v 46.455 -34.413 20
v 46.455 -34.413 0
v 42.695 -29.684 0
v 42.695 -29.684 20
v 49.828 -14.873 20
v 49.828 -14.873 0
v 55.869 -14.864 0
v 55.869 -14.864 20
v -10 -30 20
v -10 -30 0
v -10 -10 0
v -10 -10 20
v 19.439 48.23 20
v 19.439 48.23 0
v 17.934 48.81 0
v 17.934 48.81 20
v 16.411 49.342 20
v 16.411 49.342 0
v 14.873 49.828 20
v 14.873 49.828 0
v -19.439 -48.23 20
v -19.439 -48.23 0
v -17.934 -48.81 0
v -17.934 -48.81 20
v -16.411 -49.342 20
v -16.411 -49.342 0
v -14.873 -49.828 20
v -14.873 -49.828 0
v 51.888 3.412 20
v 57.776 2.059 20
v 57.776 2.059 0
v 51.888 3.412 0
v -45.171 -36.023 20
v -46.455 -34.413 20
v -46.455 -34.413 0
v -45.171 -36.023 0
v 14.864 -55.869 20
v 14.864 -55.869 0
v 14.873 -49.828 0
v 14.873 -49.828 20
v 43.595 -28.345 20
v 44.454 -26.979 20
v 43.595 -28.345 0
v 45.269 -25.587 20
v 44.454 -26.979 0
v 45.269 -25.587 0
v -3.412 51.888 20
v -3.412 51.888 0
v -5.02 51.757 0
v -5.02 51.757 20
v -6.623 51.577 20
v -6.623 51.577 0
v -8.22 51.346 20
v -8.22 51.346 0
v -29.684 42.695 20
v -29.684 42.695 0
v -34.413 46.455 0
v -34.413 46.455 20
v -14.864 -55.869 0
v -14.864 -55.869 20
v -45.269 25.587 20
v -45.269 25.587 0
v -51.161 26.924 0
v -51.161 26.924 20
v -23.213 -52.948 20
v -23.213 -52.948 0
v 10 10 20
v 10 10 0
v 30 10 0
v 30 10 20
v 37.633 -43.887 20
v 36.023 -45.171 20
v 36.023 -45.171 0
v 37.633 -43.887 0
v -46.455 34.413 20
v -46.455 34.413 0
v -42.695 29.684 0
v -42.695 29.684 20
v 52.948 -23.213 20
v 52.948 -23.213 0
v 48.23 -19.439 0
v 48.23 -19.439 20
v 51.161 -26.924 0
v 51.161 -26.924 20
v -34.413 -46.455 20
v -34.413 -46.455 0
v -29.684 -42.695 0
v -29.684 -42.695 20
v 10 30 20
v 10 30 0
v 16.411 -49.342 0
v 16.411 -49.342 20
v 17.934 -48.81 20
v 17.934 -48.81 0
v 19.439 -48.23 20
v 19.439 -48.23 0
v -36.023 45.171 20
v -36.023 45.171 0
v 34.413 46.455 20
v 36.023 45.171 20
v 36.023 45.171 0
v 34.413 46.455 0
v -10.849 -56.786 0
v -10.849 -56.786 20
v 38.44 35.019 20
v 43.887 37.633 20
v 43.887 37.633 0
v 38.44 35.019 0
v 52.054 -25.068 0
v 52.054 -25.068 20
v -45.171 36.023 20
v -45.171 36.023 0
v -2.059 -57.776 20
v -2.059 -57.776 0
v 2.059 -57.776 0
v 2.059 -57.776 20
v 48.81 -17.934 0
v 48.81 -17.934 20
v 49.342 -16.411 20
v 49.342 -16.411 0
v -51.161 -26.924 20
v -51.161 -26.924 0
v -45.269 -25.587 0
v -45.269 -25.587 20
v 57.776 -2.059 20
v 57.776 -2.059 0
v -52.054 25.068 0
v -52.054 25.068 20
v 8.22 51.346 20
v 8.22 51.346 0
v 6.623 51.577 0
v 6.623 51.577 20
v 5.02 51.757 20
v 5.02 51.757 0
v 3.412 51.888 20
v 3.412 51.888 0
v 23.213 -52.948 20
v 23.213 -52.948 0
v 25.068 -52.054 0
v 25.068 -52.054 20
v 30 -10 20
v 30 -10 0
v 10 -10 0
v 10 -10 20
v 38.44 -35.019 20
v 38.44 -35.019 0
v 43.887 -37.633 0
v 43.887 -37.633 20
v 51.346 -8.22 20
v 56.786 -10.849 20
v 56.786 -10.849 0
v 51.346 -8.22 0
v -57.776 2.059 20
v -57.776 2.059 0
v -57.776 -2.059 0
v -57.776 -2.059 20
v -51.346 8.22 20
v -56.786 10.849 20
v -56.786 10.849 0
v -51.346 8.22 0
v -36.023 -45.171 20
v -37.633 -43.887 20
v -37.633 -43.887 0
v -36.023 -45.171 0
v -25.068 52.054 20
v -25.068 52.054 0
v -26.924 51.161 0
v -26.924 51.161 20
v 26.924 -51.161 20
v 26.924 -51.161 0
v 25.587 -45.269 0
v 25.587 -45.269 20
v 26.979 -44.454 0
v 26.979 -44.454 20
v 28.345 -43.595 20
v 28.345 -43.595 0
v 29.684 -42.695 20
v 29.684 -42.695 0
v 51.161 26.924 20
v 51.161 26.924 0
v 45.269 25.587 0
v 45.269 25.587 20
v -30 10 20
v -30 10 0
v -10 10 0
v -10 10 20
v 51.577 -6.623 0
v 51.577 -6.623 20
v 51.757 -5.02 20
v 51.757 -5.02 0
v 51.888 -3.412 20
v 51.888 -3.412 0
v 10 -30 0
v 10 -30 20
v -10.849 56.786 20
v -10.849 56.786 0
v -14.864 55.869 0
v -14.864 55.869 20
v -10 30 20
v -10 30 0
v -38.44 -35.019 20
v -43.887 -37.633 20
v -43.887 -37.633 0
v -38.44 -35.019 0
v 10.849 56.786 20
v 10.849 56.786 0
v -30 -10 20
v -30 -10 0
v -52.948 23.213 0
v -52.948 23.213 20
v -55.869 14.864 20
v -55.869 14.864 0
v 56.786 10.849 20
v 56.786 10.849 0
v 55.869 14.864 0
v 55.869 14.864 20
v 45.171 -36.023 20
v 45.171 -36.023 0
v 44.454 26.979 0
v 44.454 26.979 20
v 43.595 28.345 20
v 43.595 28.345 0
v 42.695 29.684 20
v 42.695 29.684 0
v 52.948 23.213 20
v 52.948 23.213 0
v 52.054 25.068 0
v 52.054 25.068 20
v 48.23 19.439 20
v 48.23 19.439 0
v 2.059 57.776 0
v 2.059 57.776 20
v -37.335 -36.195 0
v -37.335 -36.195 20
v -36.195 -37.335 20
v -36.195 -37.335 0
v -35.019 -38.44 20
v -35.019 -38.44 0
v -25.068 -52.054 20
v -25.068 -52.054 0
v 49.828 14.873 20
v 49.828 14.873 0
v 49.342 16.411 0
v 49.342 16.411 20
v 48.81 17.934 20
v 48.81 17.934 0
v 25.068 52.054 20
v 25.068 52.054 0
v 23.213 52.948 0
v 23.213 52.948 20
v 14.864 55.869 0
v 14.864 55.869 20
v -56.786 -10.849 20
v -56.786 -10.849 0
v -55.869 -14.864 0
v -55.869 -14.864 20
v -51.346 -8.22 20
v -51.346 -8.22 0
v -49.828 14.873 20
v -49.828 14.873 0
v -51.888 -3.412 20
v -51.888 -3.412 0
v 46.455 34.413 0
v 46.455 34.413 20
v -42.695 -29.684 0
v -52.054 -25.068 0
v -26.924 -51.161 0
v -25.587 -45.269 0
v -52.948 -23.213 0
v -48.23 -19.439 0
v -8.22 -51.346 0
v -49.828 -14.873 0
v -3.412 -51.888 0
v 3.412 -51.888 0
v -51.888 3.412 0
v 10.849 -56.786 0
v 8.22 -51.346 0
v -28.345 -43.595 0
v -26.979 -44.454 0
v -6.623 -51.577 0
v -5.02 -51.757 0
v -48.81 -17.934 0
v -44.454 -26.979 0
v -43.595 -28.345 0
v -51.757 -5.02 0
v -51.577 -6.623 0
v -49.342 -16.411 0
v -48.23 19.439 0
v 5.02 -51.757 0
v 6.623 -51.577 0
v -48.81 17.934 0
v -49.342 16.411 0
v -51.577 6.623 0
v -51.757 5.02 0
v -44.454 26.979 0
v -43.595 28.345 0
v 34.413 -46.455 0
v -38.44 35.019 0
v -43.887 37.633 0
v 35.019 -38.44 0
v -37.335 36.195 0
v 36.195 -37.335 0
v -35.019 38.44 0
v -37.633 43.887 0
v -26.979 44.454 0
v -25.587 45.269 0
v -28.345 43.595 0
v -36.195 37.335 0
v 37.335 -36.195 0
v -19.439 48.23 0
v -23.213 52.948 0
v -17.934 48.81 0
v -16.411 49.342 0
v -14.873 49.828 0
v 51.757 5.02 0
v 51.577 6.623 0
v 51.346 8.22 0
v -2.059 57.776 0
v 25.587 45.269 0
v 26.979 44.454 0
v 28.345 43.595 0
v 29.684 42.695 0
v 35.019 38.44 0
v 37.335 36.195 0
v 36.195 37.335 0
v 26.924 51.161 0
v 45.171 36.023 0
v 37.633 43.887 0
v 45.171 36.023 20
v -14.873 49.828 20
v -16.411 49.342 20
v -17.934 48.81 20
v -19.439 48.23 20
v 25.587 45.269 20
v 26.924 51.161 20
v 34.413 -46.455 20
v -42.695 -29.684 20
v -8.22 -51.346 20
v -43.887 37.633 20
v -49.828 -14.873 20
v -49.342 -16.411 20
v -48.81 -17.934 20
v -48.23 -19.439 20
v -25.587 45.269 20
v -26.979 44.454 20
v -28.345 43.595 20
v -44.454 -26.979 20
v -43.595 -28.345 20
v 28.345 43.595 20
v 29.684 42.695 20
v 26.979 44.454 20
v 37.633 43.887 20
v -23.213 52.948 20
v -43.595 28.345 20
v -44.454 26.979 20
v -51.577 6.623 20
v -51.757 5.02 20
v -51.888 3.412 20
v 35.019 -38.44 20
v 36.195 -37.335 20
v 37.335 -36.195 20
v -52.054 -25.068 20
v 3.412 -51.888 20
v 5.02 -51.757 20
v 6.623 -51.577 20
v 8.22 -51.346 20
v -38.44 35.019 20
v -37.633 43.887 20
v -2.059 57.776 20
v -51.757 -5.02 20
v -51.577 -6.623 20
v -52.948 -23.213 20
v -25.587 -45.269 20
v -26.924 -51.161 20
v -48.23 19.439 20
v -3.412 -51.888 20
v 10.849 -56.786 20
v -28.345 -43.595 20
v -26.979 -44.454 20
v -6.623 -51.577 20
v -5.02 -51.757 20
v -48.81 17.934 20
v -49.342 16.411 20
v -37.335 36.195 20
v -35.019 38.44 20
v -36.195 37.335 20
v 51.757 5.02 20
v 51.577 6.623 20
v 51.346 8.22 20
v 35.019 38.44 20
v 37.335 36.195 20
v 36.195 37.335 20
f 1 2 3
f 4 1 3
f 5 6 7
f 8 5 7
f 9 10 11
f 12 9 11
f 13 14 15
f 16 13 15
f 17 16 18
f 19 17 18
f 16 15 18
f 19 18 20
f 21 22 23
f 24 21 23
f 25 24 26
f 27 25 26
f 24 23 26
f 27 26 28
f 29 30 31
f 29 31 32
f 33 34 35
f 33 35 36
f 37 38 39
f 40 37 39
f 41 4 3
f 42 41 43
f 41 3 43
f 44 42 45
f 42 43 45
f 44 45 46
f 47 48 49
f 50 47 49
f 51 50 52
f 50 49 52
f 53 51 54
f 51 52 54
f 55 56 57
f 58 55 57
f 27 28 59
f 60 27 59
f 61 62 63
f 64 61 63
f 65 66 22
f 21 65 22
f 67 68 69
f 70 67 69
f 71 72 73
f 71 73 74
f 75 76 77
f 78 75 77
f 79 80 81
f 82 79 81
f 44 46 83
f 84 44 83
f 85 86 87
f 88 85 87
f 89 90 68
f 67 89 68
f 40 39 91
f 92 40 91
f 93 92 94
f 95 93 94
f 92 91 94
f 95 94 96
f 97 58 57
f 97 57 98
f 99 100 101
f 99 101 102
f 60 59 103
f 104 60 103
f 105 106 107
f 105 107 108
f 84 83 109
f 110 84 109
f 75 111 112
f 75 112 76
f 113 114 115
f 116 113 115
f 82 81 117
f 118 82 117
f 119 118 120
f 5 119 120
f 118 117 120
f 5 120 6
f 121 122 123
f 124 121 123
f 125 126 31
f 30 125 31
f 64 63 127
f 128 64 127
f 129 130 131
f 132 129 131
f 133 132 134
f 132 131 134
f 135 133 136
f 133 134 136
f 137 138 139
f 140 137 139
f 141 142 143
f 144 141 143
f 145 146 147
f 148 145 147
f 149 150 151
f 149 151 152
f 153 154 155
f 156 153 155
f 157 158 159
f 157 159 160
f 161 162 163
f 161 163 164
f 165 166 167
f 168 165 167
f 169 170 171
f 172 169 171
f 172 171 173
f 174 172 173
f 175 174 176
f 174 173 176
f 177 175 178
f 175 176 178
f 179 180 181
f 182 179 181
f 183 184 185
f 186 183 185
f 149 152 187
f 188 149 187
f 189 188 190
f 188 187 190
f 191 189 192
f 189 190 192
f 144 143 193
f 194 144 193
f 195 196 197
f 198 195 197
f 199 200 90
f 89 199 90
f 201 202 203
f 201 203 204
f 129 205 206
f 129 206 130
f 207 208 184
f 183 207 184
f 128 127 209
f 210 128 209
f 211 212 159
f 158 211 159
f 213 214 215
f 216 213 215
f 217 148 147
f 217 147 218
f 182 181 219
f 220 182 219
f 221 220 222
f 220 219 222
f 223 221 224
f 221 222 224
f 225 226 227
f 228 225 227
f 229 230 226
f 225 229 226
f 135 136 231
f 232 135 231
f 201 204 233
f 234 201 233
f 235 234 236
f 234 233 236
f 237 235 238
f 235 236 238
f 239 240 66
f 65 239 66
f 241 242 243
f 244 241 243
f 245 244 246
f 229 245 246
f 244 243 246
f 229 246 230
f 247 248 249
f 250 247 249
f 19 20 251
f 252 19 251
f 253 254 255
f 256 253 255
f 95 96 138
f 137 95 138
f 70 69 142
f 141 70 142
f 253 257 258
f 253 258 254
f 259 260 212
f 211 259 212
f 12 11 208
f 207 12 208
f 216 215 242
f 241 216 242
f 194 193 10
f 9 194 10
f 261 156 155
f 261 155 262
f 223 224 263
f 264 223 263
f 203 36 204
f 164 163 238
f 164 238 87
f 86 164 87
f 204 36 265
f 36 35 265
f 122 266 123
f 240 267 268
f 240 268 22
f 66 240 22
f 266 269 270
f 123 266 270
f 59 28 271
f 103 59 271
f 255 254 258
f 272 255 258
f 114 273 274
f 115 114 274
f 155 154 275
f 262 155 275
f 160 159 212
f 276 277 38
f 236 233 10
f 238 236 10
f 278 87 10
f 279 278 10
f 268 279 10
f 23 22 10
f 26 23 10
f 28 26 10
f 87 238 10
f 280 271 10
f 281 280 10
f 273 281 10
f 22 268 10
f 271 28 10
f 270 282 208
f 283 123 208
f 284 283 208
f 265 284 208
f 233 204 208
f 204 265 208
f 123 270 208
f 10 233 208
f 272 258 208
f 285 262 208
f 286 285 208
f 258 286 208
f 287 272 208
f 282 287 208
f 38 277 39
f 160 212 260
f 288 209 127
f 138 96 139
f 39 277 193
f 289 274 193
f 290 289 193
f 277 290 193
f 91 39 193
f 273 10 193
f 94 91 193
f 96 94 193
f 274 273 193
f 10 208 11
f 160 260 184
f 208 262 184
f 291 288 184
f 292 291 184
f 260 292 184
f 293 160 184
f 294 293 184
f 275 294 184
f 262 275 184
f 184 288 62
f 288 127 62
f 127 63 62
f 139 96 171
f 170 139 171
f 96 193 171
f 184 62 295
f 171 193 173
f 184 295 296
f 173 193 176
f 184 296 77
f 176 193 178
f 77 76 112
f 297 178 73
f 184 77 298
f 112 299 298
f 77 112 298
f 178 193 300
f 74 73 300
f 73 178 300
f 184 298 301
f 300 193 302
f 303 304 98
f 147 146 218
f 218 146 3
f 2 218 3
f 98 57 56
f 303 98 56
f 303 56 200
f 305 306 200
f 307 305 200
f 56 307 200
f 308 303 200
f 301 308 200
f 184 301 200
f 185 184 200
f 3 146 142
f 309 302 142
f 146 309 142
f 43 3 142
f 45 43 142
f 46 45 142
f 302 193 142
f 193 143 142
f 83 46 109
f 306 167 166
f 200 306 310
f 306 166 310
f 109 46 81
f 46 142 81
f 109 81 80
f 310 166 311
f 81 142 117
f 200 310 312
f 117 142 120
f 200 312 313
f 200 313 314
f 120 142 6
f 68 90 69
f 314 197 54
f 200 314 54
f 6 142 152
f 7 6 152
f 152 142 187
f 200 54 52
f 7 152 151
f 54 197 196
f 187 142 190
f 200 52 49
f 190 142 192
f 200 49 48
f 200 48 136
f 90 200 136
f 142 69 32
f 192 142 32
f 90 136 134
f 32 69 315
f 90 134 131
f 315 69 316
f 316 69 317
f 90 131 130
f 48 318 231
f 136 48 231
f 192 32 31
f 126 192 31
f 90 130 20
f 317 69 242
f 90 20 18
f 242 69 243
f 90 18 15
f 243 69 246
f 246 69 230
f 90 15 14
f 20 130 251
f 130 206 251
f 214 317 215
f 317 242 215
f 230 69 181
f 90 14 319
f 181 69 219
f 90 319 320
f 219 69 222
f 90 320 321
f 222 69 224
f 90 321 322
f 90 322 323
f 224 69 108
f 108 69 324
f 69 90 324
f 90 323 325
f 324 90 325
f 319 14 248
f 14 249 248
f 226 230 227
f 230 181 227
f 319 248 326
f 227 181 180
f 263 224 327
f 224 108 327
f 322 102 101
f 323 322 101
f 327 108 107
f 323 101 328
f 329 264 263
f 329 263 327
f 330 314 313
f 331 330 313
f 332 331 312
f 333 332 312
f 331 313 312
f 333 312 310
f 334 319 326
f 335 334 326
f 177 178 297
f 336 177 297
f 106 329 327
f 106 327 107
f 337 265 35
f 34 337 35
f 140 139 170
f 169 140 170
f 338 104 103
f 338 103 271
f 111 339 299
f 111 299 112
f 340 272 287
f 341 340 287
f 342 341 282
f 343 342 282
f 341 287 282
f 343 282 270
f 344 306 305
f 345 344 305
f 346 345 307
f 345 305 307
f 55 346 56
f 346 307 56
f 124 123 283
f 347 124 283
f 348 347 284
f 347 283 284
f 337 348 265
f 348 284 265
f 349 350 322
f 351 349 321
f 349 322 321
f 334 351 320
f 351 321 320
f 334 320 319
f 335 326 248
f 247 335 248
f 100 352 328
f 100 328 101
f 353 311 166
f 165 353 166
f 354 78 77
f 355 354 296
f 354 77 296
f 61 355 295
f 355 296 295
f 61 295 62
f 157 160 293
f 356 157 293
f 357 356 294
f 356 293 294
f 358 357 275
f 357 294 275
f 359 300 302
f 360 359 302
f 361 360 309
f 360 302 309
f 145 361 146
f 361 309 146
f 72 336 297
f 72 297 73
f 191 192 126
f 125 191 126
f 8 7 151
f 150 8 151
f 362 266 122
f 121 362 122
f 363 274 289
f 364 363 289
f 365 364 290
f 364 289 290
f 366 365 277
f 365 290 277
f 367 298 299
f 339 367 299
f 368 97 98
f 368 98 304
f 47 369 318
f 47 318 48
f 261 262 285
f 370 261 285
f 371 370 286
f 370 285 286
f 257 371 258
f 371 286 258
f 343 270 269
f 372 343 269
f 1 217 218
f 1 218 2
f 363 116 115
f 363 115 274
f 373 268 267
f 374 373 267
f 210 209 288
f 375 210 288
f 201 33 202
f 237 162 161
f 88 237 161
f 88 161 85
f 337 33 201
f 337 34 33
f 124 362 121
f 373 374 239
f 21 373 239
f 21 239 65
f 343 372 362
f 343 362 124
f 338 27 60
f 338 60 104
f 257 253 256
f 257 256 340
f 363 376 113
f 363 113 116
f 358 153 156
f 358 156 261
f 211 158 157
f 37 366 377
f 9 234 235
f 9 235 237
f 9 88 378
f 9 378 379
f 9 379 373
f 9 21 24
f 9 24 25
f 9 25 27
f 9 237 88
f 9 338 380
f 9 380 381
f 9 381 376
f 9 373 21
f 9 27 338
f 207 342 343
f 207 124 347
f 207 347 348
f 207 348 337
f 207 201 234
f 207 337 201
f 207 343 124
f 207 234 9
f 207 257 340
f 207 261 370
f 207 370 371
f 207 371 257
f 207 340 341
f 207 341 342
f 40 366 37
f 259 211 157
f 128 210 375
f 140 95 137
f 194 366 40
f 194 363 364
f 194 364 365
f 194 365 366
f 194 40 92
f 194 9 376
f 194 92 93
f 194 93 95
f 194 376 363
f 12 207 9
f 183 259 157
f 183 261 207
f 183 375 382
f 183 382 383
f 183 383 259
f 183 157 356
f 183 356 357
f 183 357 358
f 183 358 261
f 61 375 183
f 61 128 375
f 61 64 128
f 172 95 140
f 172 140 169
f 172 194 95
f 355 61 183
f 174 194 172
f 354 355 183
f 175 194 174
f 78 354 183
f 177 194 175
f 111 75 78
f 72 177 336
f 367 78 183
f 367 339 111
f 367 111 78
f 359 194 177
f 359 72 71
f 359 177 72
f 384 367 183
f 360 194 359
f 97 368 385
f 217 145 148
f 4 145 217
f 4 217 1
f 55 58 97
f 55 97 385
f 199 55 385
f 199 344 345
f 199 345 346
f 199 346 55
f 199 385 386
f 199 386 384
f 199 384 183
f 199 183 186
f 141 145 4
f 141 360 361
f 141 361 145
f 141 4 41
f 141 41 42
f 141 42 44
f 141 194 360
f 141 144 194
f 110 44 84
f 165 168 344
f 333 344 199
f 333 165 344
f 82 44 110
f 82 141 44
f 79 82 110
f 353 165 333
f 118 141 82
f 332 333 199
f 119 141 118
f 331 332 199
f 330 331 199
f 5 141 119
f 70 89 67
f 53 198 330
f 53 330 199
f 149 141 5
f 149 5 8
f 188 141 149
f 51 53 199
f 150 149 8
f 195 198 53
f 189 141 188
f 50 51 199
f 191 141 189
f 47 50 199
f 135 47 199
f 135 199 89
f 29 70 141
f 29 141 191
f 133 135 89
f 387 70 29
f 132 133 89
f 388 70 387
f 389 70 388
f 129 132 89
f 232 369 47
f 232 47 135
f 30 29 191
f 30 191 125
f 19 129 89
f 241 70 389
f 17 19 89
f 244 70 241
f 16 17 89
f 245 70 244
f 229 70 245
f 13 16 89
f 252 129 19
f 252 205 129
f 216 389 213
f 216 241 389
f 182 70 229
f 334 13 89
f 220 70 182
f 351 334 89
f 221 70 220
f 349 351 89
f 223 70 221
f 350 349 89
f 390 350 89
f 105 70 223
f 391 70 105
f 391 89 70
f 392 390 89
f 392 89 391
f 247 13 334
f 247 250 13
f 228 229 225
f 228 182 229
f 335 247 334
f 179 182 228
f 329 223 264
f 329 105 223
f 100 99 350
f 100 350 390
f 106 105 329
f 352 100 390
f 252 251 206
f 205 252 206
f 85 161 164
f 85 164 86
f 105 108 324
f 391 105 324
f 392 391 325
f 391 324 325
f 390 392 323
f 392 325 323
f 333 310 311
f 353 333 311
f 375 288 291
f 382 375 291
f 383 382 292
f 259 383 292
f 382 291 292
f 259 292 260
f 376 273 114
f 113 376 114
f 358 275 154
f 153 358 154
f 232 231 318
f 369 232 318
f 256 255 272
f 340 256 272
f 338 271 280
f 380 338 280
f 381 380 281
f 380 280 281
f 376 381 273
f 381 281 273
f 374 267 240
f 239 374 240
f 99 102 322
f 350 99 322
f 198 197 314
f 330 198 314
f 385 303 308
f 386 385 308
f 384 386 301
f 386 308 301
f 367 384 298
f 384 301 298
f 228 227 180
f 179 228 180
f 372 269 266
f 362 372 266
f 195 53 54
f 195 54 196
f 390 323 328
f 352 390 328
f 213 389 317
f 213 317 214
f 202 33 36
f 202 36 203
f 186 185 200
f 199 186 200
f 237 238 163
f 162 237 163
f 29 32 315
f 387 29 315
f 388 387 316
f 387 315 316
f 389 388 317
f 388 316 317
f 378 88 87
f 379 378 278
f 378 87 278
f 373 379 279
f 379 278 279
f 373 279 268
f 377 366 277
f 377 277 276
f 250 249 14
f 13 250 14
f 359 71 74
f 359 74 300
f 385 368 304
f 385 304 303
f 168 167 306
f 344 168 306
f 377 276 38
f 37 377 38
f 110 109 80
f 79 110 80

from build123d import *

# Parameters (mm, degrees)
F1_DEPTH = 20


with BuildPart() as f1:
    # F0 (on Top) → F1 (new body)
    with BuildSketch(Plane.XY):
        with BuildLine():
            ThreePointArc((51.887942, -3.411964), (51.971978, -1.706902), (52, 0))
            ThreePointArc((52, 0), (51.971978, 1.706902), (51.887942, 3.411964))
            ThreePointArc((51.887942, 3.411964), (51.673035, 5.822153), (51.346236, 8.219734))
            ThreePointArc((51.346236, 8.219734), (50.696251, 11.571089), (49.827769, 14.872573))
            ThreePointArc((49.827769, 14.872573), (49.081933, 17.174511), (48.229816, 19.43926))
            ThreePointArc((48.229816, 19.43926), (46.850381, 22.561954), (45.269024, 25.587408))
            ThreePointArc((45.269024, 25.587408), (44.029658, 27.665668), (42.694951, 29.684021))
            ThreePointArc((42.694951, 29.684021), (40.655237, 32.42147), (38.440301, 35.019184))
            ThreePointArc((38.440301, 35.019184), (36.769553, 36.769553), (35.019184, 38.440301))
            ThreePointArc((35.019184, 38.440301), (32.42147, 40.655237), (29.684021, 42.694951))
            ThreePointArc((29.684021, 42.694951), (27.665668, 44.029658), (25.587408, 45.269024))
            ThreePointArc((25.587408, 45.269024), (22.561954, 46.850381), (19.43926, 48.229816))
            ThreePointArc((19.43926, 48.229816), (17.174511, 49.081933), (14.872573, 49.827769))
            ThreePointArc((14.872573, 49.827769), (11.571089, 50.696251), (8.219734, 51.346236))
            ThreePointArc((8.219734, 51.346236), (5.822153, 51.673035), (3.411964, 51.887942))
            ThreePointArc((3.411964, 51.887942), (0, 52), (-3.411964, 51.887942))
            ThreePointArc((-3.411964, 51.887942), (-5.822153, 51.673035), (-8.219734, 51.346236))
            ThreePointArc((-8.219734, 51.346236), (-11.571089, 50.696251), (-14.872573, 49.827769))
            ThreePointArc((-14.872573, 49.827769), (-17.174511, 49.081933), (-19.43926, 48.229816))
            ThreePointArc((-19.43926, 48.229816), (-22.561954, 46.850381), (-25.587408, 45.269024))
            ThreePointArc((-25.587408, 45.269024), (-27.665668, 44.029658), (-29.684021, 42.694951))
            ThreePointArc((-29.684021, 42.694951), (-32.42147, 40.655237), (-35.019184, 38.440301))
            ThreePointArc((-35.019184, 38.440301), (-36.769553, 36.769553), (-38.440301, 35.019184))
            ThreePointArc((-38.440301, 35.019184), (-40.655237, 32.42147), (-42.694951, 29.684021))
            ThreePointArc((-42.694951, 29.684021), (-44.029658, 27.665668), (-45.269024, 25.587408))
            ThreePointArc((-45.269024, 25.587408), (-46.850381, 22.561954), (-48.229816, 19.43926))
            ThreePointArc((-48.229816, 19.43926), (-49.081933, 17.174511), (-49.827769, 14.872573))
            ThreePointArc((-49.827769, 14.872573), (-50.696251, 11.571089), (-51.346236, 8.219734))
            ThreePointArc((-51.346236, 8.219734), (-51.673035, 5.822153), (-51.887942, 3.411964))
            ThreePointArc((-51.887942, 3.411964), (-52, 0), (-51.887942, -3.411964))
            ThreePointArc((-51.887942, -3.411964), (-51.673035, -5.822153), (-51.346236, -8.219734))
            ThreePointArc((-51.346236, -8.219734), (-50.696251, -11.571089), (-49.827769, -14.872573))
            ThreePointArc((-49.827769, -14.872573), (-49.081933, -17.174511), (-48.229816, -19.43926))
            ThreePointArc((-48.229816, -19.43926), (-46.850381, -22.561954), (-45.269024, -25.587408))
            ThreePointArc((-45.269024, -25.587408), (-44.029658, -27.665668), (-42.694951, -29.684021))
            ThreePointArc((-42.694951, -29.684021), (-40.655237, -32.42147), (-38.440301, -35.019184))
            ThreePointArc((-38.440301, -35.019184), (-36.769553, -36.769553), (-35.019184, -38.440301))
            ThreePointArc((-35.019184, -38.440301), (-32.42147, -40.655237), (-29.684021, -42.694951))
            ThreePointArc((-29.684021, -42.694951), (-27.665668, -44.029658), (-25.587408, -45.269024))
            ThreePointArc((-25.587408, -45.269024), (-22.561954, -46.850381), (-19.43926, -48.229816))
            ThreePointArc((-19.43926, -48.229816), (-17.174511, -49.081933), (-14.872573, -49.827769))
            ThreePointArc((-14.872573, -49.827769), (-11.571089, -50.696251), (-8.219734, -51.346236))
            ThreePointArc((-8.219734, -51.346236), (-5.822153, -51.673035), (-3.411964, -51.887942))
            ThreePointArc((-3.411964, -51.887942), (0, -52), (3.411964, -51.887942))
            ThreePointArc((3.411964, -51.887942), (5.822153, -51.673035), (8.219734, -51.346236))
            ThreePointArc((8.219734, -51.346236), (11.571089, -50.696251), (14.872573, -49.827769))
            ThreePointArc((14.872573, -49.827769), (17.174511, -49.081933), (19.43926, -48.229816))
            ThreePointArc((19.43926, -48.229816), (22.561954, -46.850381), (25.587408, -45.269024))
            ThreePointArc((25.587408, -45.269024), (27.665668, -44.029658), (29.684021, -42.694951))
            ThreePointArc((29.684021, -42.694951), (32.42147, -40.655237), (35.019184, -38.440301))
            ThreePointArc((35.019184, -38.440301), (36.769553, -36.769553), (38.440301, -35.019184))
            ThreePointArc((38.440301, -35.019184), (40.655237, -32.42147), (42.694951, -29.684021))
            ThreePointArc((42.694951, -29.684021), (44.029658, -27.665668), (45.269024, -25.587408))
            ThreePointArc((45.269024, -25.587408), (46.850381, -22.561954), (48.229816, -19.43926))
            ThreePointArc((48.229816, -19.43926), (49.081933, -17.174511), (49.827769, -14.872573))
            ThreePointArc((49.827769, -14.872573), (50.696251, -11.571089), (51.346236, -8.219734))
            ThreePointArc((51.346236, -8.219734), (51.673035, -5.822153), (51.887942, -3.411964))
        make_face()
        Polygon((-10, 30), (0, 30), (10, 30), (10, 10), (30, 10), (30, 0), (30, -10), (10, -10), (10, -30), (0, -30), (-10, -30), (-10, -10), (-30, -10), (-30, 0), (-30, 10), (-10, 10), align=None, mode=Mode.SUBTRACT)
        with BuildLine():
            ThreePointArc((51.887942, 3.411964), (51.971978, 1.706902), (52, 0))
            ThreePointArc((52, 0), (51.971978, -1.706902), (51.887942, -3.411964))
            Line((51.887942, -3.411964), (57.775974, -2.059396))
            Line((57.775974, -2.059396), (57.775974, 0))
            Line((57.775974, 0), (57.775974, 2.059396))
            Line((57.775974, 2.059396), (51.887942, 3.411964))
        make_face()
        with BuildLine():
            ThreePointArc((49.827769, 14.872573), (50.696251, 11.571089), (51.346236, 8.219734))
            Line((51.346236, 8.219734), (56.785669, 10.848601))
            Line((56.785669, 10.848601), (56.32741, 12.856364))
            Line((56.32741, 12.856364), (55.869151, 14.864127))
            Line((55.869151, 14.864127), (49.827769, 14.872573))
        make_face()
        with BuildLine():
            Line((56.785669, -10.848601), (51.346236, -8.219734))
            ThreePointArc((51.346236, -8.219734), (50.696251, -11.571089), (49.827769, -14.872573))
            Line((49.827769, -14.872573), (55.869151, -14.864127))
            Line((55.869151, -14.864127), (56.32741, -12.856364))
            Line((56.32741, -12.856364), (56.785669, -10.848601))
        make_face()
        with BuildLine():
            ThreePointArc((45.269024, 25.587408), (46.850381, 22.561954), (48.229816, 19.43926))
            Line((48.229816, 19.43926), (52.947893, 23.212604))
            Line((52.947893, 23.212604), (52.054354, 25.068056))
            Line((52.054354, 25.068056), (51.160816, 26.923508))
            Line((51.160816, 26.923508), (45.269024, 25.587408))
        make_face()
        with BuildLine():
            Line((52.947893, -23.212604), (48.229816, -19.43926))
            ThreePointArc((48.229816, -19.43926), (46.850381, -22.561954), (45.269024, -25.587408))
            Line((45.269024, -25.587408), (51.160816, -26.923508))
            Line((51.160816, -26.923508), (52.054354, -25.068056))
            Line((52.054354, -25.068056), (52.947893, -23.212604))
        make_face()
        with BuildLine():
            ThreePointArc((38.440301, 35.019184), (40.655237, 32.42147), (42.694951, 29.684021))
            Line((42.694951, 29.684021), (46.455088, 34.41263))
            Line((46.455088, 34.41263), (45.171076, 36.022731))
            Line((45.171076, 36.022731), (43.887063, 37.632832))
            Line((43.887063, 37.632832), (38.440301, 35.019184))
        make_face()
        with BuildLine():
            Line((46.455088, -34.41263), (42.694951, -29.684021))
            ThreePointArc((42.694951, -29.684021), (40.655237, -32.42147), (38.440301, -35.019184))
            Line((38.440301, -35.019184), (43.887063, -37.632832))
            Line((43.887063, -37.632832), (45.171076, -36.022731))
            Line((45.171076, -36.022731), (46.455088, -34.41263))
        make_face()
        with BuildLine():
            ThreePointArc((29.684021, 42.694951), (32.42147, 40.655237), (35.019184, 38.440301))
            Line((35.019184, 38.440301), (37.632832, 43.887063))
            Line((37.632832, 43.887063), (36.022731, 45.171076))
            Line((36.022731, 45.171076), (34.41263, 46.455088))
            Line((34.41263, 46.455088), (29.684021, 42.694951))
        make_face()
        with BuildLine():
            Line((37.632832, -43.887063), (35.019184, -38.440301))
            ThreePointArc((35.019184, -38.440301), (32.42147, -40.655237), (29.684021, -42.694951))
            Line((29.684021, -42.694951), (34.41263, -46.455088))
            Line((34.41263, -46.455088), (36.022731, -45.171076))
            Line((36.022731, -45.171076), (37.632832, -43.887063))
        make_face()
        with BuildLine():
            ThreePointArc((19.43926, 48.229816), (22.561954, 46.850381), (25.587408, 45.269024))
            Line((25.587408, 45.269024), (26.923508, 51.160816))
            Line((26.923508, 51.160816), (25.068056, 52.054354))
            Line((25.068056, 52.054354), (23.212604, 52.947893))
            Line((23.212604, 52.947893), (19.43926, 48.229816))
        make_face()
        with BuildLine():
            Line((26.923508, -51.160816), (25.587408, -45.269024))
            ThreePointArc((25.587408, -45.269024), (22.561954, -46.850381), (19.43926, -48.229816))
            Line((19.43926, -48.229816), (23.212604, -52.947893))
            Line((23.212604, -52.947893), (25.068056, -52.054354))
            Line((25.068056, -52.054354), (26.923508, -51.160816))
        make_face()
        with BuildLine():
            ThreePointArc((8.219734, 51.346236), (11.571089, 50.696251), (14.872573, 49.827769))
            Line((14.872573, 49.827769), (14.864127, 55.869151))
            Line((14.864127, 55.869151), (12.856364, 56.32741))
            Line((12.856364, 56.32741), (10.848601, 56.785669))
            Line((10.848601, 56.785669), (8.219734, 51.346236))
        make_face()
        with BuildLine():
            Line((14.864127, -55.869151), (14.872573, -49.827769))
            ThreePointArc((14.872573, -49.827769), (11.571089, -50.696251), (8.219734, -51.346236))
            Line((8.219734, -51.346236), (10.848601, -56.785669))
            Line((10.848601, -56.785669), (12.856364, -56.32741))
            Line((12.856364, -56.32741), (14.864127, -55.869151))
        make_face()
        with BuildLine():
            ThreePointArc((-3.411964, 51.887942), (0, 52), (3.411964, 51.887942))
            Line((3.411964, 51.887942), (2.059396, 57.775974))
            Line((2.059396, 57.775974), (0, 57.775974))
            Line((0, 57.775974), (-2.059396, 57.775974))
            Line((-2.059396, 57.775974), (-3.411964, 51.887942))
        make_face()
        with BuildLine():
            Line((2.059396, -57.775974), (3.411964, -51.887942))
            ThreePointArc((3.411964, -51.887942), (0, -52), (-3.411964, -51.887942))
            Line((-3.411964, -51.887942), (-2.059396, -57.775974))
            Line((-2.059396, -57.775974), (0, -57.775974))
            Line((0, -57.775974), (2.059396, -57.775974))
        make_face()
        with BuildLine():
            ThreePointArc((-14.872573, 49.827769), (-11.571089, 50.696251), (-8.219734, 51.346236))
            Line((-8.219734, 51.346236), (-10.848601, 56.785669))
            Line((-10.848601, 56.785669), (-12.856364, 56.32741))
            Line((-12.856364, 56.32741), (-14.864127, 55.869151))
            Line((-14.864127, 55.869151), (-14.872573, 49.827769))
        make_face()
        with BuildLine():
            Line((-10.848601, -56.785669), (-8.219734, -51.346236))
            ThreePointArc((-8.219734, -51.346236), (-11.571089, -50.696251), (-14.872573, -49.827769))
            Line((-14.872573, -49.827769), (-14.864127, -55.869151))
            Line((-14.864127, -55.869151), (-12.856364, -56.32741))
            Line((-12.856364, -56.32741), (-10.848601, -56.785669))
        make_face()
        with BuildLine():
            ThreePointArc((-25.587408, 45.269024), (-22.561954, 46.850381), (-19.43926, 48.229816))
            Line((-19.43926, 48.229816), (-23.212604, 52.947893))
            Line((-23.212604, 52.947893), (-25.068056, 52.054354))
            Line((-25.068056, 52.054354), (-26.923508, 51.160816))
            Line((-26.923508, 51.160816), (-25.587408, 45.269024))
        make_face()
        with BuildLine():
            Line((-23.212604, -52.947893), (-19.43926, -48.229816))
            ThreePointArc((-19.43926, -48.229816), (-22.561954, -46.850381), (-25.587408, -45.269024))
            Line((-25.587408, -45.269024), (-26.923508, -51.160816))
            Line((-26.923508, -51.160816), (-25.068056, -52.054354))
            Line((-25.068056, -52.054354), (-23.212604, -52.947893))
        make_face()
        with BuildLine():
            ThreePointArc((-35.019184, 38.440301), (-32.42147, 40.655237), (-29.684021, 42.694951))
            Line((-29.684021, 42.694951), (-34.41263, 46.455088))
            Line((-34.41263, 46.455088), (-36.022731, 45.171076))
            Line((-36.022731, 45.171076), (-37.632832, 43.887063))
            Line((-37.632832, 43.887063), (-35.019184, 38.440301))
        make_face()
        with BuildLine():
            Line((-34.41263, -46.455088), (-29.684021, -42.694951))
            ThreePointArc((-29.684021, -42.694951), (-32.42147, -40.655237), (-35.019184, -38.440301))
            Line((-35.019184, -38.440301), (-37.632832, -43.887063))
            Line((-37.632832, -43.887063), (-36.022731, -45.171076))
            Line((-36.022731, -45.171076), (-34.41263, -46.455088))
        make_face()
        with BuildLine():
            ThreePointArc((-42.694951, 29.684021), (-40.655237, 32.42147), (-38.440301, 35.019184))
            Line((-38.440301, 35.019184), (-43.887063, 37.632832))
            Line((-43.887063, 37.632832), (-45.171076, 36.022731))
            Line((-45.171076, 36.022731), (-46.455088, 34.41263))
            Line((-46.455088, 34.41263), (-42.694951, 29.684021))
        make_face()
        with BuildLine():
            Line((-43.887063, -37.632832), (-38.440301, -35.019184))
            ThreePointArc((-38.440301, -35.019184), (-40.655237, -32.42147), (-42.694951, -29.684021))
            Line((-42.694951, -29.684021), (-46.455088, -34.41263))
            Line((-46.455088, -34.41263), (-45.171076, -36.022731))
            Line((-45.171076, -36.022731), (-43.887063, -37.632832))
        make_face()
        with BuildLine():
            ThreePointArc((-48.229816, 19.43926), (-46.850381, 22.561954), (-45.269024, 25.587408))
            Line((-45.269024, 25.587408), (-51.160816, 26.923508))
            Line((-51.160816, 26.923508), (-52.054354, 25.068056))
            Line((-52.054354, 25.068056), (-52.947893, 23.212604))
            Line((-52.947893, 23.212604), (-48.229816, 19.43926))
        make_face()
        with BuildLine():
            Line((-51.160816, -26.923508), (-45.269024, -25.587408))
            ThreePointArc((-45.269024, -25.587408), (-46.850381, -22.561954), (-48.229816, -19.43926))
            Line((-48.229816, -19.43926), (-52.947893, -23.212604))
            Line((-52.947893, -23.212604), (-52.054354, -25.068056))
            Line((-52.054354, -25.068056), (-51.160816, -26.923508))
        make_face()
        with BuildLine():
            ThreePointArc((-51.346236, 8.219734), (-50.696251, 11.571089), (-49.827769, 14.872573))
            Line((-49.827769, 14.872573), (-55.869151, 14.864127))
            Line((-55.869151, 14.864127), (-56.32741, 12.856364))
            Line((-56.32741, 12.856364), (-56.785669, 10.848601))
            Line((-56.785669, 10.848601), (-51.346236, 8.219734))
        make_face()
        with BuildLine():
            Line((-55.869151, -14.864127), (-49.827769, -14.872573))
            ThreePointArc((-49.827769, -14.872573), (-50.696251, -11.571089), (-51.346236, -8.219734))
            Line((-51.346236, -8.219734), (-56.785669, -10.848601))
            Line((-56.785669, -10.848601), (-56.32741, -12.856364))
            Line((-56.32741, -12.856364), (-55.869151, -14.864127))
        make_face()
        with BuildLine():
            ThreePointArc((-51.887942, -3.411964), (-52, 0), (-51.887942, 3.411964))
            Line((-51.887942, 3.411964), (-57.775974, 2.059396))
            Line((-57.775974, 2.059396), (-57.775974, 0))
            Line((-57.775974, 0), (-57.775974, -2.059396))
            Line((-57.775974, -2.059396), (-51.887942, -3.411964))
        make_face()
    extrude(amount=F1_DEPTH)


solid = f1.part
